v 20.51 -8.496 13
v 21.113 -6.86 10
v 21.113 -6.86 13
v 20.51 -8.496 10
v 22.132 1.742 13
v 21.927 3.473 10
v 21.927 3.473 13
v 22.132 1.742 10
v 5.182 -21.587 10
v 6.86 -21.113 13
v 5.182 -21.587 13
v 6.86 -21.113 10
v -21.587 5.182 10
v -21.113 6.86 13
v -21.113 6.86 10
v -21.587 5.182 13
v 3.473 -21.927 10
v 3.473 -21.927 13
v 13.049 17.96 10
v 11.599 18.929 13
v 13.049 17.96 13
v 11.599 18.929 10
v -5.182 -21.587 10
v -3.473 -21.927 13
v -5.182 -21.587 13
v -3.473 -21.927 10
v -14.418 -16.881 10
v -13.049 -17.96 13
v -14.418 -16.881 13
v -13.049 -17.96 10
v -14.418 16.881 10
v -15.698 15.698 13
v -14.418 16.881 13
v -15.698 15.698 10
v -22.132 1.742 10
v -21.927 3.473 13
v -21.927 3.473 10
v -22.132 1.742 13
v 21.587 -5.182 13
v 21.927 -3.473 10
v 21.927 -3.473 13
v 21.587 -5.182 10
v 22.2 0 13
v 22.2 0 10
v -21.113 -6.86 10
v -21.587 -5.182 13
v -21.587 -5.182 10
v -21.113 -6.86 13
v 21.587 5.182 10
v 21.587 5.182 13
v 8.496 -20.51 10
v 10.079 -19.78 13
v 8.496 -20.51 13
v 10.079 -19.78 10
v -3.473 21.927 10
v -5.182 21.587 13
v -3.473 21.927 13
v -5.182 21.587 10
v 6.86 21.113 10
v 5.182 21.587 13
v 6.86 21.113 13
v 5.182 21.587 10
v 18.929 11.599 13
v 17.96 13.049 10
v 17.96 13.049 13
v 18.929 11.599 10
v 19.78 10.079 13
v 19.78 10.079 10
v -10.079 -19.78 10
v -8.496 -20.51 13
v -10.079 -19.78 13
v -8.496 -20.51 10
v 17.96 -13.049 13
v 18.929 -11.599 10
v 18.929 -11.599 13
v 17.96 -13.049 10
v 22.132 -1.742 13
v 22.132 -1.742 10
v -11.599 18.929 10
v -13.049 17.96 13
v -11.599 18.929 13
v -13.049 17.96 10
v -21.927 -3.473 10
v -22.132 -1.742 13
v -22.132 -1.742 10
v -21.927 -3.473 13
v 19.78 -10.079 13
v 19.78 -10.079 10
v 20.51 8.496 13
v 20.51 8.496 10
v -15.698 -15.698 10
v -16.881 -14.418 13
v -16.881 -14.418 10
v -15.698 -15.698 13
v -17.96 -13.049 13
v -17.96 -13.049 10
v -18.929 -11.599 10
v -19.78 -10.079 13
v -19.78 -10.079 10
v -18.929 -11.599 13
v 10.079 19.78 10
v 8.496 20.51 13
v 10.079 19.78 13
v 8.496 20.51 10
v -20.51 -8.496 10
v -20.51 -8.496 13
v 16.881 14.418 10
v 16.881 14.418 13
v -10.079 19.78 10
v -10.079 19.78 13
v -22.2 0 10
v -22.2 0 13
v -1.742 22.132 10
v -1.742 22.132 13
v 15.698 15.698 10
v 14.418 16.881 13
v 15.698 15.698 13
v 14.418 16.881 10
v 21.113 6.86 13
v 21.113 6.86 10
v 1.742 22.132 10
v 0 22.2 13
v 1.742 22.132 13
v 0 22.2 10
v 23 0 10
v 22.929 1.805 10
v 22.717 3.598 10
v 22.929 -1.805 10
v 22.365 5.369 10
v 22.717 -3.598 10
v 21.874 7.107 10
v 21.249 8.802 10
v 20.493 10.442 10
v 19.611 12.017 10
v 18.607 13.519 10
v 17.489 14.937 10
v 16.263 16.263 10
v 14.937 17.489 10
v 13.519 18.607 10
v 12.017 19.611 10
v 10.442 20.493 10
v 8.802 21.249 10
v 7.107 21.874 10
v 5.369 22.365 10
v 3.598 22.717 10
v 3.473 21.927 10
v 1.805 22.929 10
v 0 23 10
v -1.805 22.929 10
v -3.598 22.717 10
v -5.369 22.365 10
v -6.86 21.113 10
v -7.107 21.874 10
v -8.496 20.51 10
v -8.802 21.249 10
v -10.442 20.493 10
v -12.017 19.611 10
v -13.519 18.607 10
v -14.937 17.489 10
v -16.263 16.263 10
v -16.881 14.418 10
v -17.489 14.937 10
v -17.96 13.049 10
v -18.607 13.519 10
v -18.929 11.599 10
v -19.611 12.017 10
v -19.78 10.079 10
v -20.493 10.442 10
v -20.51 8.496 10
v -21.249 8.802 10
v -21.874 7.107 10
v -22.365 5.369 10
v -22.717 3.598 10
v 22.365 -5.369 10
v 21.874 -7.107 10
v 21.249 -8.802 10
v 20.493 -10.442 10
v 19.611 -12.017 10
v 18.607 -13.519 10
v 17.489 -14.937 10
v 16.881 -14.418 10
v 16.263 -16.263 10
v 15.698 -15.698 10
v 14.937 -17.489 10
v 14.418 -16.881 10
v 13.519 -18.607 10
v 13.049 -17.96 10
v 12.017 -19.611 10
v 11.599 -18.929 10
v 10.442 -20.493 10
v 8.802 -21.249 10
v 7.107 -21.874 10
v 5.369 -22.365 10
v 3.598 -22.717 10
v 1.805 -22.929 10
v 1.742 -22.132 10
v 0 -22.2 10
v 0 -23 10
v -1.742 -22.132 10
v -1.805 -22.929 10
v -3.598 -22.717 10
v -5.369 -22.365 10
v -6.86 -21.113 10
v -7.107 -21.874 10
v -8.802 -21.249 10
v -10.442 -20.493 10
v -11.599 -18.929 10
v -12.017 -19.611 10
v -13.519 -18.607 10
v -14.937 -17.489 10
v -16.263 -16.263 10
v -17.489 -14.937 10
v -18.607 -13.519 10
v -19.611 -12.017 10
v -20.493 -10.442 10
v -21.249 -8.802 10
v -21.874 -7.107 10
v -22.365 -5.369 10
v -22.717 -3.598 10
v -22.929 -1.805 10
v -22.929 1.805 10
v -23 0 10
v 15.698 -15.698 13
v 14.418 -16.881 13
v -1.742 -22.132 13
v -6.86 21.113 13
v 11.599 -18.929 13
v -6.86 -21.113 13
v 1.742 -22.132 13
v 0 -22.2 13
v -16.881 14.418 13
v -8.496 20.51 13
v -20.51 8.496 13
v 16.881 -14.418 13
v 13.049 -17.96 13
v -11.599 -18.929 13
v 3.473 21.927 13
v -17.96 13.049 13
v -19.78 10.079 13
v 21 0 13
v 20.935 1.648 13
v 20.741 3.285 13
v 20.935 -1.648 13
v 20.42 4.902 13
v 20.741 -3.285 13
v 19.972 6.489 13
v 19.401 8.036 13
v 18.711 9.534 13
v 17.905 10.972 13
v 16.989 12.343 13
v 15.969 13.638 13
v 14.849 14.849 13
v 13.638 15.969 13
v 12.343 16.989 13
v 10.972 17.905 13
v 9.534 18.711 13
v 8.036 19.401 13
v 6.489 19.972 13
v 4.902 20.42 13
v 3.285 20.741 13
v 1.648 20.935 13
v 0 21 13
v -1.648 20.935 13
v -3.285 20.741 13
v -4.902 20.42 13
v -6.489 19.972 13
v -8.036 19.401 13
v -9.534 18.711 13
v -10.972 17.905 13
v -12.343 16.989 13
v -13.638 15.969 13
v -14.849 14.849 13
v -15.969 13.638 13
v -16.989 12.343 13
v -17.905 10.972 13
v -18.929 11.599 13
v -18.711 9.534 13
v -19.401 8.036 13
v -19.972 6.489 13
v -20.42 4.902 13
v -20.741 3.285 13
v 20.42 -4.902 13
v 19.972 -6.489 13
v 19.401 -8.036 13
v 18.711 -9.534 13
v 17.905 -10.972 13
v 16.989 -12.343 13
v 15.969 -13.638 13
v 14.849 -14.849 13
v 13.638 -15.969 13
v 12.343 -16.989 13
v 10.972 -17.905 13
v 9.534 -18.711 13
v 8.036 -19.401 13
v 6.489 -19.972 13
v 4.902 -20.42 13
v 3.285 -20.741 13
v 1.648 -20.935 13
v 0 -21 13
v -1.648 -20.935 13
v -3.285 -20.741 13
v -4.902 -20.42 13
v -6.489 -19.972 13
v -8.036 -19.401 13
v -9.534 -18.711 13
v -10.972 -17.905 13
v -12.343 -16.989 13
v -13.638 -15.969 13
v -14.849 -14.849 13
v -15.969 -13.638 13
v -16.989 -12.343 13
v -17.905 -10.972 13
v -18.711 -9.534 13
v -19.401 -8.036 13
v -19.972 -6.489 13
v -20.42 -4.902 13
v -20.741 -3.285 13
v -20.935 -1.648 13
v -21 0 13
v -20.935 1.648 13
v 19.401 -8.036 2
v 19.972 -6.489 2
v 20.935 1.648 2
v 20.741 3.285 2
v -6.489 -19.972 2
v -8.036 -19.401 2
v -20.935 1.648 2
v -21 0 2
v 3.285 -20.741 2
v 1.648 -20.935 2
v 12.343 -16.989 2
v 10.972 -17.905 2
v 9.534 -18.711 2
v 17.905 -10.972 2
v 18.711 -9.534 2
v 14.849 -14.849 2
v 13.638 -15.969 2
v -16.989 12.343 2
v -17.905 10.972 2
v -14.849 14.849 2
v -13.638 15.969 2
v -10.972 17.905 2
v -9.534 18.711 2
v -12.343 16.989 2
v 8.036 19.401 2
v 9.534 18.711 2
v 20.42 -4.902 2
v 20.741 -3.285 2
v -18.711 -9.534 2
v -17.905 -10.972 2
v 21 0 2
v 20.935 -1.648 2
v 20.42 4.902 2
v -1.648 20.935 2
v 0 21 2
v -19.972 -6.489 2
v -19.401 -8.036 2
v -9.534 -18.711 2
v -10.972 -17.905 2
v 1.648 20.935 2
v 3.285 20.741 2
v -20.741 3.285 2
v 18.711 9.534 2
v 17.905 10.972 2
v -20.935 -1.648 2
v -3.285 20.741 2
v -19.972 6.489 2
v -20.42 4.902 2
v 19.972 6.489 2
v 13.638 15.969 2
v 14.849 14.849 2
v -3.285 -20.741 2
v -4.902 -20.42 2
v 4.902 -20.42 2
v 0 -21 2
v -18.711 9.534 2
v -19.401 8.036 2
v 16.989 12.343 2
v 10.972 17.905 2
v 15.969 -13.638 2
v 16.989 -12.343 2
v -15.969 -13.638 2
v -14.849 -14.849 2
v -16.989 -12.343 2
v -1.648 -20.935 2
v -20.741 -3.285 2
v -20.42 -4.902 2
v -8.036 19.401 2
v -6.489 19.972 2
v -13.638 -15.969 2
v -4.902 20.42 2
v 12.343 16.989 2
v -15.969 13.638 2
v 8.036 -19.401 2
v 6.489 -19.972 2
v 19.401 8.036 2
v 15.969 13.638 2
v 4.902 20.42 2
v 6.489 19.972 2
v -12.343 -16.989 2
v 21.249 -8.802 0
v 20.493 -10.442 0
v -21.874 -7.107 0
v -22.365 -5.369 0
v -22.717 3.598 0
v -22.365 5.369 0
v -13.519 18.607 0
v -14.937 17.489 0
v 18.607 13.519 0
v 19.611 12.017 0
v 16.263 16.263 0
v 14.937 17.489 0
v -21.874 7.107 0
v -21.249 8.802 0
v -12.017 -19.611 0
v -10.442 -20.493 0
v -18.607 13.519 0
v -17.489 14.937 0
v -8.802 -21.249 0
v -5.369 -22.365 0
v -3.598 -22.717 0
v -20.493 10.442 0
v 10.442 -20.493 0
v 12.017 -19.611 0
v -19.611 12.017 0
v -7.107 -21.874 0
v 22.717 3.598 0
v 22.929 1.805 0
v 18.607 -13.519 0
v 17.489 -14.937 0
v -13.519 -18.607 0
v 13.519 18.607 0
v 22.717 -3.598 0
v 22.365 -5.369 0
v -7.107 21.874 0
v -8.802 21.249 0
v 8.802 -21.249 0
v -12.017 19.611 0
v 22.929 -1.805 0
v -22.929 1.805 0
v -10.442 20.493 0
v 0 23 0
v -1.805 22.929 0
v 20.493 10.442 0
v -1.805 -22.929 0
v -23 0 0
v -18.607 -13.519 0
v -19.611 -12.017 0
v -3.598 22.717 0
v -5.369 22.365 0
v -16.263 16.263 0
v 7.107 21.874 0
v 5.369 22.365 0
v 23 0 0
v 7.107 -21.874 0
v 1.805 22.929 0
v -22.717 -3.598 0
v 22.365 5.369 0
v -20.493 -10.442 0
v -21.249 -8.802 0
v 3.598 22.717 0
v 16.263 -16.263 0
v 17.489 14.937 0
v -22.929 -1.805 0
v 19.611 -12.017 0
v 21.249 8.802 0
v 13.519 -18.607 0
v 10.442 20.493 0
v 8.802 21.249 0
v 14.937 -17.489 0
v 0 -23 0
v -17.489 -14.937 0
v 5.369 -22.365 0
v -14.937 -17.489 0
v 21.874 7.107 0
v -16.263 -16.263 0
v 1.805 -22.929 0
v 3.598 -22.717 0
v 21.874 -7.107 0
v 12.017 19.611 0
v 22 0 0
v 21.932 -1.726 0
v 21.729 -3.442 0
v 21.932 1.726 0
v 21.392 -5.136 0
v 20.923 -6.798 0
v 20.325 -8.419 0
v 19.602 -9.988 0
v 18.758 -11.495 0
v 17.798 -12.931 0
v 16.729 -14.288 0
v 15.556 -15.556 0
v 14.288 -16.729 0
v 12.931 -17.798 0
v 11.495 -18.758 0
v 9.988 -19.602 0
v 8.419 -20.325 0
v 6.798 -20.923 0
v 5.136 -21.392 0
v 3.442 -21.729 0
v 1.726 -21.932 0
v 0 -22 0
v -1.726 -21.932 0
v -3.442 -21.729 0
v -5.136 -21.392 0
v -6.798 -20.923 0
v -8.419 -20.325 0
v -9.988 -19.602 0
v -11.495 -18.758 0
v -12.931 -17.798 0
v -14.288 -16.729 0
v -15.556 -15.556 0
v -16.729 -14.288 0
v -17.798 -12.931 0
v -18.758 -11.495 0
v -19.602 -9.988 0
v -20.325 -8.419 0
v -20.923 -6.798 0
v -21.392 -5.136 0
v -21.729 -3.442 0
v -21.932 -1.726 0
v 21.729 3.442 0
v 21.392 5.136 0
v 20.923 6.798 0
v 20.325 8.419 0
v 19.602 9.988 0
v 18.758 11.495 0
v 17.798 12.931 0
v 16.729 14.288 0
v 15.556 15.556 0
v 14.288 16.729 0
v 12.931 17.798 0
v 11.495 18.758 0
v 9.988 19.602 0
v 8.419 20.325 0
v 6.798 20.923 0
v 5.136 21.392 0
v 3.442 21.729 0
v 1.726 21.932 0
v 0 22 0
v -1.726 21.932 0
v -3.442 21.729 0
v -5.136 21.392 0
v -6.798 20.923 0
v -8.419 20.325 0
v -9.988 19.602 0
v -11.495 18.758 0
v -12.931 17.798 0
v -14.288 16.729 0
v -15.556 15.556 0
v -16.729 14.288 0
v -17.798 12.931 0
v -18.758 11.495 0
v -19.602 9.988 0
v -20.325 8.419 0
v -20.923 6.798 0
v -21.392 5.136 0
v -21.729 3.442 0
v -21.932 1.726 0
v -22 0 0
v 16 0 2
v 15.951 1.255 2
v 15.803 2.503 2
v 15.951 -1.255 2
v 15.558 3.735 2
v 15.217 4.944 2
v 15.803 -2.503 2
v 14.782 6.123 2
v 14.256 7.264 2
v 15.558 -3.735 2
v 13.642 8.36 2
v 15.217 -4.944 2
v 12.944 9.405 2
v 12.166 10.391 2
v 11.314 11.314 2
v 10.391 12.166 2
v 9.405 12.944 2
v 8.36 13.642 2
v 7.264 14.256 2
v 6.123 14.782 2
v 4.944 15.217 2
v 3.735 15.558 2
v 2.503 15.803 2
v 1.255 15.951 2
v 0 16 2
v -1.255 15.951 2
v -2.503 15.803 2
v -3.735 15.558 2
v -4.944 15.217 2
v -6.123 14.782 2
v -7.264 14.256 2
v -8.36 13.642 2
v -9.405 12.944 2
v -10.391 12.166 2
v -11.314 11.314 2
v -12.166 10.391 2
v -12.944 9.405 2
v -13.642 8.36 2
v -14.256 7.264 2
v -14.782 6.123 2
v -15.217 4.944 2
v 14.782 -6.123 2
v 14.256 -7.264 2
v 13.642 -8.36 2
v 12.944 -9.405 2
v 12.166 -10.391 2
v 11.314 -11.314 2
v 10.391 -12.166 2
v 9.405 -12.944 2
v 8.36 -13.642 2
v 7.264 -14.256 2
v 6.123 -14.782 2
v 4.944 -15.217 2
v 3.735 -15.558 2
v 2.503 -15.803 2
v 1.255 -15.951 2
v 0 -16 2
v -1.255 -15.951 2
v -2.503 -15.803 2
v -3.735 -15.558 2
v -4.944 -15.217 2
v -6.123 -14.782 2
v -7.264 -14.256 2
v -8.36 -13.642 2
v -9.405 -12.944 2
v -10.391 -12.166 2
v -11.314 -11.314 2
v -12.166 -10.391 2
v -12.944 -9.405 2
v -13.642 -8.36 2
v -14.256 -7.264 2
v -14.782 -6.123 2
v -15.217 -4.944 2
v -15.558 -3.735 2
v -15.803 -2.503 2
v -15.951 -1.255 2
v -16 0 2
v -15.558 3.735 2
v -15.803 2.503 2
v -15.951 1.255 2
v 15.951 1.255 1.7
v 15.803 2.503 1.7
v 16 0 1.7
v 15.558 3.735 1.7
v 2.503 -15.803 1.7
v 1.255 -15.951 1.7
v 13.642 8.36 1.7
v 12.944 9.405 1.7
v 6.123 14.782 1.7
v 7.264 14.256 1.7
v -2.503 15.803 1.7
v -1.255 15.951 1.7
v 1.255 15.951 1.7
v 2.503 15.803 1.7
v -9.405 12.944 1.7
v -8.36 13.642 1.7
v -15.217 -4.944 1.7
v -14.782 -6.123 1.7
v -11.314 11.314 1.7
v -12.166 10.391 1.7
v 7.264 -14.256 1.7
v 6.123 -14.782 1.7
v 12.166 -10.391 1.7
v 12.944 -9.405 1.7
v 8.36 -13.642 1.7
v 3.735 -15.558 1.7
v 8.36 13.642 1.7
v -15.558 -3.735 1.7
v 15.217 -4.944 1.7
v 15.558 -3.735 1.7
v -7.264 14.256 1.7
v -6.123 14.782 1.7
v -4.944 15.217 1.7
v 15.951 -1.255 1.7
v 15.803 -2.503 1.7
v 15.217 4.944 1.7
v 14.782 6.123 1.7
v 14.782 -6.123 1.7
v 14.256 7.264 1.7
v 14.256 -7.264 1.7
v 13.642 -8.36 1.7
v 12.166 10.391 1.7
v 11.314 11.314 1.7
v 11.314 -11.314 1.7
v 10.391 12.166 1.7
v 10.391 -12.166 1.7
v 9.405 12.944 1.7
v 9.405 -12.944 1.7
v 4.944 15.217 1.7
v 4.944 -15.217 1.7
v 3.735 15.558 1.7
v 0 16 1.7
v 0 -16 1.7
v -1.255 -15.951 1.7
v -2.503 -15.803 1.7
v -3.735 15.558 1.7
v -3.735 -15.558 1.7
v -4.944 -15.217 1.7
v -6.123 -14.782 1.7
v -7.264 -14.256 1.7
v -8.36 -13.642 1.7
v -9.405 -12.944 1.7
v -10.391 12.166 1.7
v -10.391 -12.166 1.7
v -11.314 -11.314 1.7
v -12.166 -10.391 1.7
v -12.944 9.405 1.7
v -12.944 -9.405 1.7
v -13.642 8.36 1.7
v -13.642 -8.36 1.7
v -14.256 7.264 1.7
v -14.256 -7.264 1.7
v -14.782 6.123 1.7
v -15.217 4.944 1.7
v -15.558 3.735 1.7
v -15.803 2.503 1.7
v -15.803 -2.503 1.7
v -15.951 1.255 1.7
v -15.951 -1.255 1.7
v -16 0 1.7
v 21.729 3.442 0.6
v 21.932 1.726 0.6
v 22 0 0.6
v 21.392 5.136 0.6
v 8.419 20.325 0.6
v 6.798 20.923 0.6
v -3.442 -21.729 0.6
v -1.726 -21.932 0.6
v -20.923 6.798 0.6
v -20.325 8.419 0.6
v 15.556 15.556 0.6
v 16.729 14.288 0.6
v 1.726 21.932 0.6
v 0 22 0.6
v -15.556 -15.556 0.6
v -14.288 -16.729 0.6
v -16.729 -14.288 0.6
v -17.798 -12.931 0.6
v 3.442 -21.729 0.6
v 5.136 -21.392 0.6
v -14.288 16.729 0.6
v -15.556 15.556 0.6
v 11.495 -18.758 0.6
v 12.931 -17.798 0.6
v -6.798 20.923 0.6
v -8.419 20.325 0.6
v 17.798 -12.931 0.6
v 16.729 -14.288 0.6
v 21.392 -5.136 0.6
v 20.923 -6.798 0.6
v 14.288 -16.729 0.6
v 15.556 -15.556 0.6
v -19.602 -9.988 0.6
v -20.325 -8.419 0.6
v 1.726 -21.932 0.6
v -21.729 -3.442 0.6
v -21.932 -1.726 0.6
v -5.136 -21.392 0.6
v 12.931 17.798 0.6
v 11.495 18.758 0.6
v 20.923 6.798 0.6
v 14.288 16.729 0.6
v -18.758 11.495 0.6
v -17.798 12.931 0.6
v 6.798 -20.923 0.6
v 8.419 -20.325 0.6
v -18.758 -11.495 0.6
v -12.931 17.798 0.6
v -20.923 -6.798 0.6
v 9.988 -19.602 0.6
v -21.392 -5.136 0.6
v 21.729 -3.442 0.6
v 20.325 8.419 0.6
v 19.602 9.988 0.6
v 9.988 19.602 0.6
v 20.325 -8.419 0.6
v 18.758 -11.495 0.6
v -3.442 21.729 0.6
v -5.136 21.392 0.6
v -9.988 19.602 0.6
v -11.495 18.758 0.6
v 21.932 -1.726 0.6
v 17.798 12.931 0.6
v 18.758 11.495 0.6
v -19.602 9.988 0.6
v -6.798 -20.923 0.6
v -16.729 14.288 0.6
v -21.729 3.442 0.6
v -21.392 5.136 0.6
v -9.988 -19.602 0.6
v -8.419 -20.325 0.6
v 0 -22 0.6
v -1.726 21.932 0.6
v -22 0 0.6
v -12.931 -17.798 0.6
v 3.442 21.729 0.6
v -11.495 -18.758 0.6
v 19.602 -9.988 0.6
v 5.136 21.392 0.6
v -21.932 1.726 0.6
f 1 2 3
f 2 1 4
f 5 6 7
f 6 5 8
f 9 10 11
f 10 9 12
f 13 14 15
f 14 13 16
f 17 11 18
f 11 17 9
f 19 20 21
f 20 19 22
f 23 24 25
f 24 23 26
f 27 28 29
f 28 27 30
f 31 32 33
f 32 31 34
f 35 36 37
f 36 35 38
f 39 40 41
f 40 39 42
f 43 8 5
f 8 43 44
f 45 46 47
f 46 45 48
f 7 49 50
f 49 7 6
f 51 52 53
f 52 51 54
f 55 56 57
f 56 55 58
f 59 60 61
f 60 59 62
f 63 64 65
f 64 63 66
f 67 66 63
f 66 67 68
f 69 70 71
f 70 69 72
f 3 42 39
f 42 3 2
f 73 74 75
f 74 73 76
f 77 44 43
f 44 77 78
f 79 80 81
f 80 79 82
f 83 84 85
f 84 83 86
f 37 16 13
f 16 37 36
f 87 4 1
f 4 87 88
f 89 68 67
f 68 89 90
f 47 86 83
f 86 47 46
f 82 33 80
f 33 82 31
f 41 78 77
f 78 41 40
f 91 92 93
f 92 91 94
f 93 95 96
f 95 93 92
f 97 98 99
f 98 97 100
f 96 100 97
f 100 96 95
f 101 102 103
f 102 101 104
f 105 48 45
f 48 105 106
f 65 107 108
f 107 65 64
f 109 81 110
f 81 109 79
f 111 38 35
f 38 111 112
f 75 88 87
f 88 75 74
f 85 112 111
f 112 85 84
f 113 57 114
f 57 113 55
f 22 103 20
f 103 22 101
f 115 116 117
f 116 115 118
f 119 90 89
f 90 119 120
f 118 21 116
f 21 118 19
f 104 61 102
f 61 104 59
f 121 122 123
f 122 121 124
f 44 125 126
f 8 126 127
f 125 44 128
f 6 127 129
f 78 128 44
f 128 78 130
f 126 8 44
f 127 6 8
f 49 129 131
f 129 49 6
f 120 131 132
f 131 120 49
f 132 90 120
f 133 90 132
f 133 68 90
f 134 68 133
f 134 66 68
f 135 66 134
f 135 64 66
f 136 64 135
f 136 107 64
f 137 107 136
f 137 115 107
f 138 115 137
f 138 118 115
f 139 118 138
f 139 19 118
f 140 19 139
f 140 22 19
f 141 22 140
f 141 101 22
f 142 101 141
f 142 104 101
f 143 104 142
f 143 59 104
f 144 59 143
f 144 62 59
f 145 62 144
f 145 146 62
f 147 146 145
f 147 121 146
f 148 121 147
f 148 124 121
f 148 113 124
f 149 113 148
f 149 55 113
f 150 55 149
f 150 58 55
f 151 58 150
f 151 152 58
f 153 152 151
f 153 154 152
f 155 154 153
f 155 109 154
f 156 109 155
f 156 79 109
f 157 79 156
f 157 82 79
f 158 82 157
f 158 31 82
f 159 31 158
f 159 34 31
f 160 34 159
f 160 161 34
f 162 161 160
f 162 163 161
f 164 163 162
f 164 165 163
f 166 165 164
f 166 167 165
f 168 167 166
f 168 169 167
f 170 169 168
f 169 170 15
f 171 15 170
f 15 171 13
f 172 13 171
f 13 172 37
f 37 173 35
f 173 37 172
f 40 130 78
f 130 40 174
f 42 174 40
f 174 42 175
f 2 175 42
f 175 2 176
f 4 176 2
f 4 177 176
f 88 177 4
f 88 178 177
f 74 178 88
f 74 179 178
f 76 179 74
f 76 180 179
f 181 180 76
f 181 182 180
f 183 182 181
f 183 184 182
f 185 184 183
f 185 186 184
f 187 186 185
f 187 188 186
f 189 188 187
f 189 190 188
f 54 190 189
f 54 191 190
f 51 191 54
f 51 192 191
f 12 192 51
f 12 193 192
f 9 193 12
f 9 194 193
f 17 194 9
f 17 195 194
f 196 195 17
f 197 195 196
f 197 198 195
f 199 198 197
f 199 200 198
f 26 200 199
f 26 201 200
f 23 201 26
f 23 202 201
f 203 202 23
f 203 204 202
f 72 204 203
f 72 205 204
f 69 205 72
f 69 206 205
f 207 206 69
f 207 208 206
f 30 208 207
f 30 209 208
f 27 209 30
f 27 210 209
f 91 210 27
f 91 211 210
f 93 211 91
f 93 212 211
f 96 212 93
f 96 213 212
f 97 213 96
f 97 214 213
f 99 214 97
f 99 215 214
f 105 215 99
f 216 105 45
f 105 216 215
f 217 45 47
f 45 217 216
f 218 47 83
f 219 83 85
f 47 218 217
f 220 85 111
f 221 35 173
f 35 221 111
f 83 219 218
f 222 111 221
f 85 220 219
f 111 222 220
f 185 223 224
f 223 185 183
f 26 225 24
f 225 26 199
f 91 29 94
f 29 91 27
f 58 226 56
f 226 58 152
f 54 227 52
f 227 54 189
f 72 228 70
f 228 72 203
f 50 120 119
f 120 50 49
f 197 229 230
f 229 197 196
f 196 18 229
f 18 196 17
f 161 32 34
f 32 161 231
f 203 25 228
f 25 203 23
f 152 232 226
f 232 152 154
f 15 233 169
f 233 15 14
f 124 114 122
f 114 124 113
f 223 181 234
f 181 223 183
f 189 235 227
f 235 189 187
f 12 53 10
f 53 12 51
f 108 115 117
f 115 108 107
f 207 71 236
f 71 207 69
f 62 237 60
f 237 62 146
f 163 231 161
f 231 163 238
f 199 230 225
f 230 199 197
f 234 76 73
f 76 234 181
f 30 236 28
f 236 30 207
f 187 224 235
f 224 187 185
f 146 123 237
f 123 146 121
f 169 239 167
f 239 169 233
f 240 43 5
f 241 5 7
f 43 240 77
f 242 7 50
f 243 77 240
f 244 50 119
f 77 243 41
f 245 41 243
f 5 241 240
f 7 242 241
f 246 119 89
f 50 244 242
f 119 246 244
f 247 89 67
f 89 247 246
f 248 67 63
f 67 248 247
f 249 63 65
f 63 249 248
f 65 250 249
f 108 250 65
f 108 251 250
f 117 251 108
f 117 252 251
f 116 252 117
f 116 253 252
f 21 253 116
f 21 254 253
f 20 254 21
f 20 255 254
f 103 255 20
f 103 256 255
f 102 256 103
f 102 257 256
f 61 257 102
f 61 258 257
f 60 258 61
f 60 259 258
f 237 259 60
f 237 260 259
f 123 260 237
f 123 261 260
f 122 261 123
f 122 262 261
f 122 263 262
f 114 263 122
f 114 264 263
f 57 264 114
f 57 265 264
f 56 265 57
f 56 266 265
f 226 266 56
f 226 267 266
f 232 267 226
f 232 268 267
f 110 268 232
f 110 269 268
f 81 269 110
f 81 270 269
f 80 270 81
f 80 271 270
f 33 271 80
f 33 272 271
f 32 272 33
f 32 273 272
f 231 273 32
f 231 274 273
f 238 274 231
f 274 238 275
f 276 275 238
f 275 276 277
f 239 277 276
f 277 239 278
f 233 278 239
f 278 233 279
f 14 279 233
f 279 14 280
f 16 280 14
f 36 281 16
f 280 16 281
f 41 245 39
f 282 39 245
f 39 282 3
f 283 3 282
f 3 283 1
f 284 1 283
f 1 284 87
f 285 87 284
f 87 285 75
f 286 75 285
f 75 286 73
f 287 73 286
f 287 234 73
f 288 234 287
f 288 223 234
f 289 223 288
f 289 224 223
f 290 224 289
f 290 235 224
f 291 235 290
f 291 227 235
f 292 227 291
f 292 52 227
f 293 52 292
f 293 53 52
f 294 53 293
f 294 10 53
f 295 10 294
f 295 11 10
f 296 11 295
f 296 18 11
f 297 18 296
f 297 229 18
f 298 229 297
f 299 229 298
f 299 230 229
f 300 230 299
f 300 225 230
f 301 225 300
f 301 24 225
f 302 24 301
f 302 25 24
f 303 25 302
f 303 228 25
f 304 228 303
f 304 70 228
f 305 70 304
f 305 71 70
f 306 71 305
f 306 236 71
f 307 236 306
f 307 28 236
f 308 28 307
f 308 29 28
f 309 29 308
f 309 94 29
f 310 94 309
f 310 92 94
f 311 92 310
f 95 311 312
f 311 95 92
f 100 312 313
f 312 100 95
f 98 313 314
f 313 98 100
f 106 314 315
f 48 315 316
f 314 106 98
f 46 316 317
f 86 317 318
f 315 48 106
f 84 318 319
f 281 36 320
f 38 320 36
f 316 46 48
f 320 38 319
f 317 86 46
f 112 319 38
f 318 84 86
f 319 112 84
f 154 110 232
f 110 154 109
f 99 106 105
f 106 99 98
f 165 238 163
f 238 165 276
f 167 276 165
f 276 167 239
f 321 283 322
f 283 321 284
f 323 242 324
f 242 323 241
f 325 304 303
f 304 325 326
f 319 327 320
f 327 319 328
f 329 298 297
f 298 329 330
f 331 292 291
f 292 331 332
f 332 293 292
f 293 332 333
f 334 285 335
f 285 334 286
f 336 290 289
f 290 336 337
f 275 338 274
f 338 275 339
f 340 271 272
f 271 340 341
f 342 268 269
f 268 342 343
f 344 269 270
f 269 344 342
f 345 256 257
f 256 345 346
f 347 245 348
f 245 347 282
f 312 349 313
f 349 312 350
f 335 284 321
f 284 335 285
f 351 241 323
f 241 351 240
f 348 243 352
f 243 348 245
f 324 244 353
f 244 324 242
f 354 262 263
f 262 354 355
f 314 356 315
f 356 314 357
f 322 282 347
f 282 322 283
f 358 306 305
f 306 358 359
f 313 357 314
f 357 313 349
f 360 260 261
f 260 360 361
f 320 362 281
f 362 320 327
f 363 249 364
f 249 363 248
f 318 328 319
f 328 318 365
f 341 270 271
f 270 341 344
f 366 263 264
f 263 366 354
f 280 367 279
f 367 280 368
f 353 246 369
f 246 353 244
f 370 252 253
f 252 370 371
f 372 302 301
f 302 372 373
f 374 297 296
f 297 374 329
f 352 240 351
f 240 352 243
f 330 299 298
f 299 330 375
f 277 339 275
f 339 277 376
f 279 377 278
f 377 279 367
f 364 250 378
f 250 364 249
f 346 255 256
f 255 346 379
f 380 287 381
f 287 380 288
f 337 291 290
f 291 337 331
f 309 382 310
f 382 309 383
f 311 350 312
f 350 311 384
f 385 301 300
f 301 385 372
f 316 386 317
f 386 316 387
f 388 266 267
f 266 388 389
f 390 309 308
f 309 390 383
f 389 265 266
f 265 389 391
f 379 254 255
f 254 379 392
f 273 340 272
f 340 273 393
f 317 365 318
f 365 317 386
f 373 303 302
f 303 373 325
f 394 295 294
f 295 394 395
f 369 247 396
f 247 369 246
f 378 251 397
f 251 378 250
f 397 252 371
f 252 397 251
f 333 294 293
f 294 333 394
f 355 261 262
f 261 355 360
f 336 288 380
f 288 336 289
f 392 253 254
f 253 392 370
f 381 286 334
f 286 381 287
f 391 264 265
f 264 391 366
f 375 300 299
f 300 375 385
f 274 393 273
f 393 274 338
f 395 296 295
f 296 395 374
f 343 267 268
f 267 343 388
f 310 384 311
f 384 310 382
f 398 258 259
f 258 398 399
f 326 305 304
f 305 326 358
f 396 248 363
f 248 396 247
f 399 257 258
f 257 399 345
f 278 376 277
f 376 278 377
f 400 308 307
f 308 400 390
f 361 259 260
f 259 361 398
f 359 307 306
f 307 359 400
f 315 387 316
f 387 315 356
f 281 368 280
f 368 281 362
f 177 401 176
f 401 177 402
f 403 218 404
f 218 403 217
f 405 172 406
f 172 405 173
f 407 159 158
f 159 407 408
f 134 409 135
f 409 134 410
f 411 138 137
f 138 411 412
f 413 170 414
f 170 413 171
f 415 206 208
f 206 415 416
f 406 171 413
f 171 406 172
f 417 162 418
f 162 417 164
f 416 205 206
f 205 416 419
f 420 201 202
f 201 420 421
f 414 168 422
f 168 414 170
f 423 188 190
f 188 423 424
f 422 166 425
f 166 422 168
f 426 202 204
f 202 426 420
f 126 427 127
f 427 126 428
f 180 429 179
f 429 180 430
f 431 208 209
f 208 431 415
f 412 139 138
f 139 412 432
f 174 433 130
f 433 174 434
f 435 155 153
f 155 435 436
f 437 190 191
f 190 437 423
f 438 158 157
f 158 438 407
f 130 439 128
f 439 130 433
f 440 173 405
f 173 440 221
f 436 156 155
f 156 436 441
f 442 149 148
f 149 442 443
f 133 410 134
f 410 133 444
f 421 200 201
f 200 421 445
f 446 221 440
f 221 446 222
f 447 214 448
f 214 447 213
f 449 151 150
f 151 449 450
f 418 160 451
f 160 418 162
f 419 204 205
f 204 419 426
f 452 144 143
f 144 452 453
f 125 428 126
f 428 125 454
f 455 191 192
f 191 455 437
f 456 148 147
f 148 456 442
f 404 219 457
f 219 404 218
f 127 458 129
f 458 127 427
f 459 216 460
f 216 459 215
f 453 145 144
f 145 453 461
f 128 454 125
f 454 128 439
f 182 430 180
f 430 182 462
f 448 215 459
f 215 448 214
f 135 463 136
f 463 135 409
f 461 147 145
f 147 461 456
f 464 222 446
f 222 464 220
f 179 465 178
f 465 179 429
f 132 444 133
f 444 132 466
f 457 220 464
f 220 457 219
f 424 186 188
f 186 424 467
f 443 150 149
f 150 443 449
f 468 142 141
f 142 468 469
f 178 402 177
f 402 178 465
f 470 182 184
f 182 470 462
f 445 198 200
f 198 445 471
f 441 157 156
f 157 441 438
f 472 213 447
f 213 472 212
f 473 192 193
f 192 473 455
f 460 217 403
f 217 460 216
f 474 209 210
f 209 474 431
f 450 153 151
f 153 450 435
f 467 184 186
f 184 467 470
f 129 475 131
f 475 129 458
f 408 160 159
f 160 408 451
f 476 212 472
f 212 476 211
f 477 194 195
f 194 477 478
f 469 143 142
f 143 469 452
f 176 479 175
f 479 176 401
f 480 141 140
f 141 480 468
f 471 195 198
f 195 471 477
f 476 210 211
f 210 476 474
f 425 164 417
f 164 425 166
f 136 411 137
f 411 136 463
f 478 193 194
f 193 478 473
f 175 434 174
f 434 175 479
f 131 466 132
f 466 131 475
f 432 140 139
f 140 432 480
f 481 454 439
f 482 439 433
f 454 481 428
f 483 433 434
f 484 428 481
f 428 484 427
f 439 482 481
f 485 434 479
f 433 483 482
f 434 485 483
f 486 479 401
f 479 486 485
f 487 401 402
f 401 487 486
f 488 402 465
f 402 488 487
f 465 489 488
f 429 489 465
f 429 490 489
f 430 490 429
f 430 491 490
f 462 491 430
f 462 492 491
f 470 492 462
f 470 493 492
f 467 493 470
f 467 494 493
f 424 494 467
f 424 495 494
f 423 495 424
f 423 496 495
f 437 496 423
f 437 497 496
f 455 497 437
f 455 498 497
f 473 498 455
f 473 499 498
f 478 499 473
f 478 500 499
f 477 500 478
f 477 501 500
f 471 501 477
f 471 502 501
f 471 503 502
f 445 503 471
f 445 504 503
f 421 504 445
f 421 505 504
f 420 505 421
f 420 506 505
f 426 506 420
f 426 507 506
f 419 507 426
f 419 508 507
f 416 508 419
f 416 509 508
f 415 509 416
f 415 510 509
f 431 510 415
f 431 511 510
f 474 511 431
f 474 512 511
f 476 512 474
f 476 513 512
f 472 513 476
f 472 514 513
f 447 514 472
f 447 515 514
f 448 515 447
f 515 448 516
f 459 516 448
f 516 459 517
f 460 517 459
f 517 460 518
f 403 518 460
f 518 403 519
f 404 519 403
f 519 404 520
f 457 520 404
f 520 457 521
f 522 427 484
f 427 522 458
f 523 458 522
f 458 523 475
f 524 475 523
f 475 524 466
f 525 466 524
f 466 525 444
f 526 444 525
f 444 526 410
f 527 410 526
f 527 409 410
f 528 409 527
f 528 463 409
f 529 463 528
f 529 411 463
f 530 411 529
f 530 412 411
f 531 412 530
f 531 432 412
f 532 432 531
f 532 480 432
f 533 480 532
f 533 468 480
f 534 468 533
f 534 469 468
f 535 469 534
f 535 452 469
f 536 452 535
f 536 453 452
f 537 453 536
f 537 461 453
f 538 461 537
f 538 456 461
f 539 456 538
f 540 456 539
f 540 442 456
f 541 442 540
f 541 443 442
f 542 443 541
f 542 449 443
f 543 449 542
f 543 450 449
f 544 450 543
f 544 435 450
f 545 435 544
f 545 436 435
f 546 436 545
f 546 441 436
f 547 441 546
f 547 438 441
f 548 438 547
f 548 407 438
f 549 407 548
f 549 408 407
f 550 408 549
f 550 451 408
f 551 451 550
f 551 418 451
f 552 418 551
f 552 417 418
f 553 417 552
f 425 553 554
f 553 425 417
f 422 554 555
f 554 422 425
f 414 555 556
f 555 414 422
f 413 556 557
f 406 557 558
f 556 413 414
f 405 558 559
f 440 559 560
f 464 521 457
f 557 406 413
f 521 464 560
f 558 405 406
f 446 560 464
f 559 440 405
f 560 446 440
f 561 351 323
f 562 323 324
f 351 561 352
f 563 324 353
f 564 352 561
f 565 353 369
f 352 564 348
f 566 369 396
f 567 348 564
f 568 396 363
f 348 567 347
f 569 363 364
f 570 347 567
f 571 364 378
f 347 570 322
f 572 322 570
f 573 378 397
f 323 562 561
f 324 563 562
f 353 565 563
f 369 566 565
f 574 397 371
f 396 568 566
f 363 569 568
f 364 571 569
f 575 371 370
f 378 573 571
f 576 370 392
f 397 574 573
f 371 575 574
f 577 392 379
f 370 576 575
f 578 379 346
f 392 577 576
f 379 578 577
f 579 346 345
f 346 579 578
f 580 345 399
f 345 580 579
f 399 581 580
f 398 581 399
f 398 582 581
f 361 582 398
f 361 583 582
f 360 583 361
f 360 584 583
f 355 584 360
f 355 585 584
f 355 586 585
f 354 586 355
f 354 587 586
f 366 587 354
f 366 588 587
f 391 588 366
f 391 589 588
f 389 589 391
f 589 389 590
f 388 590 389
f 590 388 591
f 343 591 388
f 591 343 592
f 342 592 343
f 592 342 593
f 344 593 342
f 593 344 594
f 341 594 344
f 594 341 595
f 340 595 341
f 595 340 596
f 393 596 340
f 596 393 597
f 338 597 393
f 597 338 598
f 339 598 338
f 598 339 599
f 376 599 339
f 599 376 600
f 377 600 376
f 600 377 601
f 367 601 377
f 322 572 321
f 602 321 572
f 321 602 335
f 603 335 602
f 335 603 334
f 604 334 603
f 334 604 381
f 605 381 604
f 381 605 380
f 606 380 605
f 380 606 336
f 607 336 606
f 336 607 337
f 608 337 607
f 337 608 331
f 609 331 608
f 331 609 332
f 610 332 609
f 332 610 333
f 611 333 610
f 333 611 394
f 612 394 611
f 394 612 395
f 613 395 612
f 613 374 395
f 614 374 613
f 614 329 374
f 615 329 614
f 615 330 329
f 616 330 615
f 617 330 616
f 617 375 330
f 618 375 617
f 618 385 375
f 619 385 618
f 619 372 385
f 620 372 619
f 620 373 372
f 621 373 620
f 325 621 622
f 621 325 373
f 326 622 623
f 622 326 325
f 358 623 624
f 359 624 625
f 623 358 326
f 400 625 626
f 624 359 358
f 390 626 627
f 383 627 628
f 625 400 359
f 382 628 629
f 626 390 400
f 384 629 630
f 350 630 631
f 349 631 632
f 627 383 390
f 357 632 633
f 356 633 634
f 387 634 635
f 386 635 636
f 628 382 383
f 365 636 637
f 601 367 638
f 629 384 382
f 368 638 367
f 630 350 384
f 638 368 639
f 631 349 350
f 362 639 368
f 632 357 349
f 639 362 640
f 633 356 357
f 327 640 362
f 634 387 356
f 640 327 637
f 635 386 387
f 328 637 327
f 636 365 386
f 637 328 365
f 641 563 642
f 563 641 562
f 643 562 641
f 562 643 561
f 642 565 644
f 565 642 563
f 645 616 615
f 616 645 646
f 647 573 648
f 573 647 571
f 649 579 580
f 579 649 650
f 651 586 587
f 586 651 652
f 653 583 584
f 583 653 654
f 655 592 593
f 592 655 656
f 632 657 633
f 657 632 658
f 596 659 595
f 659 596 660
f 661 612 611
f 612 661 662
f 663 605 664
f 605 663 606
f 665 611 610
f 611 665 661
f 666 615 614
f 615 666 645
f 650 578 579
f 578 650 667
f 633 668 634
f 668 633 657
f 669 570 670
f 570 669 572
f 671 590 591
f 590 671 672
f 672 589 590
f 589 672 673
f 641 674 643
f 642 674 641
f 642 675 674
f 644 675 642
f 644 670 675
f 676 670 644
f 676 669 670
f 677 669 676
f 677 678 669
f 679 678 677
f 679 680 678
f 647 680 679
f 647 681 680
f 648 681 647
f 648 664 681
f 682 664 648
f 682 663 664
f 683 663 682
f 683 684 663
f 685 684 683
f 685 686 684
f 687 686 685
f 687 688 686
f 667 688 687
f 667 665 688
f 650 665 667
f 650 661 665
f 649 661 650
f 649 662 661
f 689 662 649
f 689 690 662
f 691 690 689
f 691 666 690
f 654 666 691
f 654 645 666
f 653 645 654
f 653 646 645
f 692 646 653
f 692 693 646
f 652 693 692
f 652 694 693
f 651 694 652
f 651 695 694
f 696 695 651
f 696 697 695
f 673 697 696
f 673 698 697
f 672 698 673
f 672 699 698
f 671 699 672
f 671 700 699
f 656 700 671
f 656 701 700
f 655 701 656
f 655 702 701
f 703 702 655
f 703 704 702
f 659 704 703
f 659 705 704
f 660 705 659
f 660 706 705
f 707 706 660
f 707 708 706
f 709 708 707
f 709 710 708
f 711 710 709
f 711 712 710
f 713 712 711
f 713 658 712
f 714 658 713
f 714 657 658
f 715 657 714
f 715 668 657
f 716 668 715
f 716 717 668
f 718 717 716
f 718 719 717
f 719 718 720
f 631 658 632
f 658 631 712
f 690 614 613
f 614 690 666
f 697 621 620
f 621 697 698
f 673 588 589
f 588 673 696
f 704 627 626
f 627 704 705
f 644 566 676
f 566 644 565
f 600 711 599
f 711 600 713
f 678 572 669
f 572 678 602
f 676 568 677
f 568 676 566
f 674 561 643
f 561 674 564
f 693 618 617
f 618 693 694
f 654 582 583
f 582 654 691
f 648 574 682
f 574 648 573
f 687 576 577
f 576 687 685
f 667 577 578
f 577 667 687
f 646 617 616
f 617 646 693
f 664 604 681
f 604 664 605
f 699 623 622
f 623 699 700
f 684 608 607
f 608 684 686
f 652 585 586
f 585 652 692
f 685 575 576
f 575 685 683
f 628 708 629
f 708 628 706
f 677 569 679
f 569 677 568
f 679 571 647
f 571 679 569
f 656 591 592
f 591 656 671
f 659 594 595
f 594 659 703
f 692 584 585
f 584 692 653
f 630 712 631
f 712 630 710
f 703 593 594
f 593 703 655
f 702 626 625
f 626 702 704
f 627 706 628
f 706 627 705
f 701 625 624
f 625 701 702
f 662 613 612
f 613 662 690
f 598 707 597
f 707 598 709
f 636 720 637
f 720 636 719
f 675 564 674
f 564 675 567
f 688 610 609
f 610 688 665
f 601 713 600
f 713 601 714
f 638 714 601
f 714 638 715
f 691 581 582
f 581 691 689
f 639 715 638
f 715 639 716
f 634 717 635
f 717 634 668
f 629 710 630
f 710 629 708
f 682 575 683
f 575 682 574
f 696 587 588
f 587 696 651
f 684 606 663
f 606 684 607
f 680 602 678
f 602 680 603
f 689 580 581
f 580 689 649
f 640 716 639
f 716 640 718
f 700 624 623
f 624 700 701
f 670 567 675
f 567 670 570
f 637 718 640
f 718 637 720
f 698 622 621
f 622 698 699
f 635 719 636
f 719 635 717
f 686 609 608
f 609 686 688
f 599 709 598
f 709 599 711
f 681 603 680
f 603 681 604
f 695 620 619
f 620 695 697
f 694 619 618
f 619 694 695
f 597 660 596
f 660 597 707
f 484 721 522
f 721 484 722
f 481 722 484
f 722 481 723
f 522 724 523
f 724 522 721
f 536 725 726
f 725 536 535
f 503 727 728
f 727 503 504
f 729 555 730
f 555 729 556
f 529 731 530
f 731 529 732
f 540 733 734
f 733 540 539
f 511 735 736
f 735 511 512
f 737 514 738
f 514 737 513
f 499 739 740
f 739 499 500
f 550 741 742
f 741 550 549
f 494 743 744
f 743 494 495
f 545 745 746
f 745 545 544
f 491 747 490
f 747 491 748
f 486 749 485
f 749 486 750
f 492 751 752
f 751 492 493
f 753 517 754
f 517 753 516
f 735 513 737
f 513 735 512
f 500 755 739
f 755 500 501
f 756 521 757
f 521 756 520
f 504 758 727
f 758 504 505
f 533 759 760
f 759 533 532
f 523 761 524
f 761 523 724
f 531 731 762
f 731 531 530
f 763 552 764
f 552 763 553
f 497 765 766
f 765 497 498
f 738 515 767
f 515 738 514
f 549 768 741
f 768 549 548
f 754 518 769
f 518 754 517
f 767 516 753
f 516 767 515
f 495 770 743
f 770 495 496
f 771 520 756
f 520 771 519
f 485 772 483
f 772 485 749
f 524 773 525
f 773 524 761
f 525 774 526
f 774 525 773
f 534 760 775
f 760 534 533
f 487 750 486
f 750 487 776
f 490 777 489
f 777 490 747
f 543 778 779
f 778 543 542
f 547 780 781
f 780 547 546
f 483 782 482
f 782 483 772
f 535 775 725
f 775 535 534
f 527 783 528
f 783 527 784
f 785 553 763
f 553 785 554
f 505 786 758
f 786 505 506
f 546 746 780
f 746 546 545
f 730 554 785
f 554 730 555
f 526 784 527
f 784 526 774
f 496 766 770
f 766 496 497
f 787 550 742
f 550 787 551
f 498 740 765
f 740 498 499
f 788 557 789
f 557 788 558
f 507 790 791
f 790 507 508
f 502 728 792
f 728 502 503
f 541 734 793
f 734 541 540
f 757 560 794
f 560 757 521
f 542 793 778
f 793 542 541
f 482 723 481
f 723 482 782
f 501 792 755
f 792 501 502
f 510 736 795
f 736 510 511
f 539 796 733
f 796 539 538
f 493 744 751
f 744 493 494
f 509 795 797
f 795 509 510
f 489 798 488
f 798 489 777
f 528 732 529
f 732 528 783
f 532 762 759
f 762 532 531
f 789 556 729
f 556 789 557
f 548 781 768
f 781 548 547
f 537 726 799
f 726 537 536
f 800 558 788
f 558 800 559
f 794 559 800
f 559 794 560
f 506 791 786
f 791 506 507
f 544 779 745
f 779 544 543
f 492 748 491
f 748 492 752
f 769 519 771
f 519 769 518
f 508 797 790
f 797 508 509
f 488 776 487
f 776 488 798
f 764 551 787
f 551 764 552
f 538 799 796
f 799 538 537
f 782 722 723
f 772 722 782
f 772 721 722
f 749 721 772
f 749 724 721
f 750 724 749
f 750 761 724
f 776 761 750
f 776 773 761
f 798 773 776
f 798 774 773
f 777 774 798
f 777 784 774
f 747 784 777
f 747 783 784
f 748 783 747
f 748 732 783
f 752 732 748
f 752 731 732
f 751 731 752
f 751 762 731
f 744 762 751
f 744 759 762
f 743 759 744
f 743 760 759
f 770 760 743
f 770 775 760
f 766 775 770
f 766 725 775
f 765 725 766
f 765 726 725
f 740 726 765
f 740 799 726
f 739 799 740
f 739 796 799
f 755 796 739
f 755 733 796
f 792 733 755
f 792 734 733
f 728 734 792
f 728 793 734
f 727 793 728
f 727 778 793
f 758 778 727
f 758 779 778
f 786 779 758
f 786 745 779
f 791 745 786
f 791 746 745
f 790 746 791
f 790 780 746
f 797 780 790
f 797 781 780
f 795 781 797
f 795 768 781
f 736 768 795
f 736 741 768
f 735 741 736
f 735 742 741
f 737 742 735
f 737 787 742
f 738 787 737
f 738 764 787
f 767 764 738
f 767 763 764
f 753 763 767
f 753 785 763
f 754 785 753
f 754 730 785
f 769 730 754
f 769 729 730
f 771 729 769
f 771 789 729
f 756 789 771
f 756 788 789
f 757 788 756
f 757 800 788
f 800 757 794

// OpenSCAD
// ============================================================
// Tiki Tales — Elephant Figurine with Openable NFC Base
// ============================================================
// Source: "Cute little elephant" by Kacper1263 (MakerWorld)
// Raw size: 11.0 x 11.8 x 11.1mm (needs scaling)
// Target: ~62mm tall body + 10mm base cup = 72mm total
//
// CONCEPT: Two separate pieces
//   1. Elephant body — printed hollow (15% infill, 2mm walls)
//   2. Base cup — open tray with NFC pocket + ball bearing space
//   Elephant press-fits onto base cup via friction rim
//
// PRINT:
//   - Elephant: PLA, 0.2mm, 15% infill, 2mm walls, supports
//   - Base cup: PLA, 0.2mm, 100% infill (it's small + structural)
//
// ASSEMBLY:
//   1. Place NFC sticker (face up) in bottom pocket
//   2. Drop ball bearings into cup cavity
//   3. Press elephant onto base — rim holds it
//   4. Apply felt pad on bottom
// ============================================================

$fn = 80;

// ---- RAW MESH INFO ----
raw_file   = "raw/elephant.stl";
raw_height = 11.1;    // Z dimension of raw mesh
raw_min_z  = -5.6;    // lowest Z in raw mesh

// Bottom center offset (elephant sits asymmetrically)
raw_bottom_cx = 0.083;
raw_bottom_cy = 1.857;

// ---- TARGET DIMENSIONS ----
body_height = 62;     // elephant body height

// ---- SCALE ----
scale_f = body_height / raw_height;  // ~5.6x

// ---- BASE CUP PARAMETERS ----
base_dia    = 46;     // outer diameter (wider for ~30mm NFC keychain disc)
base_h      = 10;     // taller cup for ball bearings
wall        = 2;      // cup wall thickness
floor_h     = 2;      // cup floor thickness
base_edge_r = 1.5;    // bottom edge fillet

// Friction-fit rim (elephant presses onto this)
rim_h       = 3;      // rim height above cup lip
rim_t       = 1.2;    // rim wall thickness
rim_gap     = 0.3;    // clearance for press fit

// ---- NFC POCKET (inside cup floor) ----
nfc_dia   = 32;       // keychain disc body ~30mm + clearance
nfc_depth = 0.3;      // shallow centering recess (tag sits in open cavity)

// ---- BALL BEARING SPACE ----
// Interior cavity: ~36mm dia x ~7.4mm deep
// Fits plenty of 6mm steel ball bearings for weight

// ---- FELT PAD RECESS (bottom exterior) ----
felt_dia   = 44;      // proportional (base_dia - 2)
felt_depth = 0.6;

// ============================================================
// BASE CUP MODULE — open tray with NFC pocket
// ============================================================
module base_cup() {
    difference() {
        union() {
            // Outer cup body with rounded bottom edge
            hull() {
                // Bottom rounded edge
                translate([0, 0, base_edge_r])
                    rotate_extrude()
                        translate([base_dia/2 - base_edge_r, 0, 0])
                            circle(r=base_edge_r);
                // Top edge (flat)
                cylinder(d=base_dia, h=base_h);
            }

            // Friction-fit rim (protrudes above cup)
            translate([0, 0, base_h])
                difference() {
                    cylinder(d=base_dia - wall*2 + rim_t*2, h=rim_h);
                    translate([0, 0, -0.01])
                        cylinder(d=base_dia - wall*2, h=rim_h + 0.02);
                }
        }

        // ---- Interior cavity (hollow cup) ----
        translate([0, 0, floor_h])
            cylinder(d=base_dia - wall*2, h=base_h - floor_h + 0.01);

        // ---- NFC sticker pocket (recessed into floor) ----
        translate([0, 0, floor_h - nfc_depth])
            cylinder(d=nfc_dia, h=nfc_depth + 0.01);

        // ---- Felt pad recess (bottom exterior) ----
        translate([0, 0, -0.01])
            cylinder(d=felt_dia, h=felt_depth + 0.01);
    }
}

// ============================================================
// ELEPHANT MODULE (scaled + centered + positioned on base)
// ============================================================
module elephant() {
    // Scale up, center on bottom contact area, sit on base
    translate([0, 0, base_h + rim_h - raw_min_z * scale_f])
        scale([scale_f, scale_f, scale_f])
            translate([-raw_bottom_cx, -raw_bottom_cy, 0])
                import(raw_file, convexity=10);
}

// ============================================================
// RENDER MODES
// ============================================================
mode = "base_cup";
// "base_cup"        — just the base cup (export this as STL)
// "base_cross"      — cross-section of base to verify cavities
// "elephant"        — just the elephant (for reference)
// "assembly"        — both pieces together (preview only)
// "exploded"        — exploded view (preview only)

if (mode == "base_cup") {
    base_cup();
}
else if (mode == "base_cross") {
    difference() {
        base_cup();
        translate([-50, -50, -1])
            cube([50, 100, 50]);
    }
}
else if (mode == "elephant") {
    elephant();
}
else if (mode == "assembly") {
    base_cup();
    elephant();
}
else if (mode == "exploded") {
    base_cup();
    translate([0, 0, 15])  // lift elephant to show gap
        elephant();
}

// ============================================================
echo("=== Tiki Tales — Elephant (Openable Base) ===");
echo(str("Scale factor: ", scale_f, "x"));
echo(str("Body height: ", body_height, "mm"));
echo(str("Base cup: ", base_dia, "mm x ", base_h, "mm"));
echo(str("Interior cavity: ", base_dia - wall*2, "mm x ", base_h - floor_h, "mm"));
echo(str("Rim: ", rim_h, "mm tall, ", rim_t, "mm thick"));
echo(str("NFC pocket: ", nfc_dia, "mm x ", nfc_depth, "mm"));
echo(str("Total height: ~", body_height + base_h + rim_h, "mm"));
